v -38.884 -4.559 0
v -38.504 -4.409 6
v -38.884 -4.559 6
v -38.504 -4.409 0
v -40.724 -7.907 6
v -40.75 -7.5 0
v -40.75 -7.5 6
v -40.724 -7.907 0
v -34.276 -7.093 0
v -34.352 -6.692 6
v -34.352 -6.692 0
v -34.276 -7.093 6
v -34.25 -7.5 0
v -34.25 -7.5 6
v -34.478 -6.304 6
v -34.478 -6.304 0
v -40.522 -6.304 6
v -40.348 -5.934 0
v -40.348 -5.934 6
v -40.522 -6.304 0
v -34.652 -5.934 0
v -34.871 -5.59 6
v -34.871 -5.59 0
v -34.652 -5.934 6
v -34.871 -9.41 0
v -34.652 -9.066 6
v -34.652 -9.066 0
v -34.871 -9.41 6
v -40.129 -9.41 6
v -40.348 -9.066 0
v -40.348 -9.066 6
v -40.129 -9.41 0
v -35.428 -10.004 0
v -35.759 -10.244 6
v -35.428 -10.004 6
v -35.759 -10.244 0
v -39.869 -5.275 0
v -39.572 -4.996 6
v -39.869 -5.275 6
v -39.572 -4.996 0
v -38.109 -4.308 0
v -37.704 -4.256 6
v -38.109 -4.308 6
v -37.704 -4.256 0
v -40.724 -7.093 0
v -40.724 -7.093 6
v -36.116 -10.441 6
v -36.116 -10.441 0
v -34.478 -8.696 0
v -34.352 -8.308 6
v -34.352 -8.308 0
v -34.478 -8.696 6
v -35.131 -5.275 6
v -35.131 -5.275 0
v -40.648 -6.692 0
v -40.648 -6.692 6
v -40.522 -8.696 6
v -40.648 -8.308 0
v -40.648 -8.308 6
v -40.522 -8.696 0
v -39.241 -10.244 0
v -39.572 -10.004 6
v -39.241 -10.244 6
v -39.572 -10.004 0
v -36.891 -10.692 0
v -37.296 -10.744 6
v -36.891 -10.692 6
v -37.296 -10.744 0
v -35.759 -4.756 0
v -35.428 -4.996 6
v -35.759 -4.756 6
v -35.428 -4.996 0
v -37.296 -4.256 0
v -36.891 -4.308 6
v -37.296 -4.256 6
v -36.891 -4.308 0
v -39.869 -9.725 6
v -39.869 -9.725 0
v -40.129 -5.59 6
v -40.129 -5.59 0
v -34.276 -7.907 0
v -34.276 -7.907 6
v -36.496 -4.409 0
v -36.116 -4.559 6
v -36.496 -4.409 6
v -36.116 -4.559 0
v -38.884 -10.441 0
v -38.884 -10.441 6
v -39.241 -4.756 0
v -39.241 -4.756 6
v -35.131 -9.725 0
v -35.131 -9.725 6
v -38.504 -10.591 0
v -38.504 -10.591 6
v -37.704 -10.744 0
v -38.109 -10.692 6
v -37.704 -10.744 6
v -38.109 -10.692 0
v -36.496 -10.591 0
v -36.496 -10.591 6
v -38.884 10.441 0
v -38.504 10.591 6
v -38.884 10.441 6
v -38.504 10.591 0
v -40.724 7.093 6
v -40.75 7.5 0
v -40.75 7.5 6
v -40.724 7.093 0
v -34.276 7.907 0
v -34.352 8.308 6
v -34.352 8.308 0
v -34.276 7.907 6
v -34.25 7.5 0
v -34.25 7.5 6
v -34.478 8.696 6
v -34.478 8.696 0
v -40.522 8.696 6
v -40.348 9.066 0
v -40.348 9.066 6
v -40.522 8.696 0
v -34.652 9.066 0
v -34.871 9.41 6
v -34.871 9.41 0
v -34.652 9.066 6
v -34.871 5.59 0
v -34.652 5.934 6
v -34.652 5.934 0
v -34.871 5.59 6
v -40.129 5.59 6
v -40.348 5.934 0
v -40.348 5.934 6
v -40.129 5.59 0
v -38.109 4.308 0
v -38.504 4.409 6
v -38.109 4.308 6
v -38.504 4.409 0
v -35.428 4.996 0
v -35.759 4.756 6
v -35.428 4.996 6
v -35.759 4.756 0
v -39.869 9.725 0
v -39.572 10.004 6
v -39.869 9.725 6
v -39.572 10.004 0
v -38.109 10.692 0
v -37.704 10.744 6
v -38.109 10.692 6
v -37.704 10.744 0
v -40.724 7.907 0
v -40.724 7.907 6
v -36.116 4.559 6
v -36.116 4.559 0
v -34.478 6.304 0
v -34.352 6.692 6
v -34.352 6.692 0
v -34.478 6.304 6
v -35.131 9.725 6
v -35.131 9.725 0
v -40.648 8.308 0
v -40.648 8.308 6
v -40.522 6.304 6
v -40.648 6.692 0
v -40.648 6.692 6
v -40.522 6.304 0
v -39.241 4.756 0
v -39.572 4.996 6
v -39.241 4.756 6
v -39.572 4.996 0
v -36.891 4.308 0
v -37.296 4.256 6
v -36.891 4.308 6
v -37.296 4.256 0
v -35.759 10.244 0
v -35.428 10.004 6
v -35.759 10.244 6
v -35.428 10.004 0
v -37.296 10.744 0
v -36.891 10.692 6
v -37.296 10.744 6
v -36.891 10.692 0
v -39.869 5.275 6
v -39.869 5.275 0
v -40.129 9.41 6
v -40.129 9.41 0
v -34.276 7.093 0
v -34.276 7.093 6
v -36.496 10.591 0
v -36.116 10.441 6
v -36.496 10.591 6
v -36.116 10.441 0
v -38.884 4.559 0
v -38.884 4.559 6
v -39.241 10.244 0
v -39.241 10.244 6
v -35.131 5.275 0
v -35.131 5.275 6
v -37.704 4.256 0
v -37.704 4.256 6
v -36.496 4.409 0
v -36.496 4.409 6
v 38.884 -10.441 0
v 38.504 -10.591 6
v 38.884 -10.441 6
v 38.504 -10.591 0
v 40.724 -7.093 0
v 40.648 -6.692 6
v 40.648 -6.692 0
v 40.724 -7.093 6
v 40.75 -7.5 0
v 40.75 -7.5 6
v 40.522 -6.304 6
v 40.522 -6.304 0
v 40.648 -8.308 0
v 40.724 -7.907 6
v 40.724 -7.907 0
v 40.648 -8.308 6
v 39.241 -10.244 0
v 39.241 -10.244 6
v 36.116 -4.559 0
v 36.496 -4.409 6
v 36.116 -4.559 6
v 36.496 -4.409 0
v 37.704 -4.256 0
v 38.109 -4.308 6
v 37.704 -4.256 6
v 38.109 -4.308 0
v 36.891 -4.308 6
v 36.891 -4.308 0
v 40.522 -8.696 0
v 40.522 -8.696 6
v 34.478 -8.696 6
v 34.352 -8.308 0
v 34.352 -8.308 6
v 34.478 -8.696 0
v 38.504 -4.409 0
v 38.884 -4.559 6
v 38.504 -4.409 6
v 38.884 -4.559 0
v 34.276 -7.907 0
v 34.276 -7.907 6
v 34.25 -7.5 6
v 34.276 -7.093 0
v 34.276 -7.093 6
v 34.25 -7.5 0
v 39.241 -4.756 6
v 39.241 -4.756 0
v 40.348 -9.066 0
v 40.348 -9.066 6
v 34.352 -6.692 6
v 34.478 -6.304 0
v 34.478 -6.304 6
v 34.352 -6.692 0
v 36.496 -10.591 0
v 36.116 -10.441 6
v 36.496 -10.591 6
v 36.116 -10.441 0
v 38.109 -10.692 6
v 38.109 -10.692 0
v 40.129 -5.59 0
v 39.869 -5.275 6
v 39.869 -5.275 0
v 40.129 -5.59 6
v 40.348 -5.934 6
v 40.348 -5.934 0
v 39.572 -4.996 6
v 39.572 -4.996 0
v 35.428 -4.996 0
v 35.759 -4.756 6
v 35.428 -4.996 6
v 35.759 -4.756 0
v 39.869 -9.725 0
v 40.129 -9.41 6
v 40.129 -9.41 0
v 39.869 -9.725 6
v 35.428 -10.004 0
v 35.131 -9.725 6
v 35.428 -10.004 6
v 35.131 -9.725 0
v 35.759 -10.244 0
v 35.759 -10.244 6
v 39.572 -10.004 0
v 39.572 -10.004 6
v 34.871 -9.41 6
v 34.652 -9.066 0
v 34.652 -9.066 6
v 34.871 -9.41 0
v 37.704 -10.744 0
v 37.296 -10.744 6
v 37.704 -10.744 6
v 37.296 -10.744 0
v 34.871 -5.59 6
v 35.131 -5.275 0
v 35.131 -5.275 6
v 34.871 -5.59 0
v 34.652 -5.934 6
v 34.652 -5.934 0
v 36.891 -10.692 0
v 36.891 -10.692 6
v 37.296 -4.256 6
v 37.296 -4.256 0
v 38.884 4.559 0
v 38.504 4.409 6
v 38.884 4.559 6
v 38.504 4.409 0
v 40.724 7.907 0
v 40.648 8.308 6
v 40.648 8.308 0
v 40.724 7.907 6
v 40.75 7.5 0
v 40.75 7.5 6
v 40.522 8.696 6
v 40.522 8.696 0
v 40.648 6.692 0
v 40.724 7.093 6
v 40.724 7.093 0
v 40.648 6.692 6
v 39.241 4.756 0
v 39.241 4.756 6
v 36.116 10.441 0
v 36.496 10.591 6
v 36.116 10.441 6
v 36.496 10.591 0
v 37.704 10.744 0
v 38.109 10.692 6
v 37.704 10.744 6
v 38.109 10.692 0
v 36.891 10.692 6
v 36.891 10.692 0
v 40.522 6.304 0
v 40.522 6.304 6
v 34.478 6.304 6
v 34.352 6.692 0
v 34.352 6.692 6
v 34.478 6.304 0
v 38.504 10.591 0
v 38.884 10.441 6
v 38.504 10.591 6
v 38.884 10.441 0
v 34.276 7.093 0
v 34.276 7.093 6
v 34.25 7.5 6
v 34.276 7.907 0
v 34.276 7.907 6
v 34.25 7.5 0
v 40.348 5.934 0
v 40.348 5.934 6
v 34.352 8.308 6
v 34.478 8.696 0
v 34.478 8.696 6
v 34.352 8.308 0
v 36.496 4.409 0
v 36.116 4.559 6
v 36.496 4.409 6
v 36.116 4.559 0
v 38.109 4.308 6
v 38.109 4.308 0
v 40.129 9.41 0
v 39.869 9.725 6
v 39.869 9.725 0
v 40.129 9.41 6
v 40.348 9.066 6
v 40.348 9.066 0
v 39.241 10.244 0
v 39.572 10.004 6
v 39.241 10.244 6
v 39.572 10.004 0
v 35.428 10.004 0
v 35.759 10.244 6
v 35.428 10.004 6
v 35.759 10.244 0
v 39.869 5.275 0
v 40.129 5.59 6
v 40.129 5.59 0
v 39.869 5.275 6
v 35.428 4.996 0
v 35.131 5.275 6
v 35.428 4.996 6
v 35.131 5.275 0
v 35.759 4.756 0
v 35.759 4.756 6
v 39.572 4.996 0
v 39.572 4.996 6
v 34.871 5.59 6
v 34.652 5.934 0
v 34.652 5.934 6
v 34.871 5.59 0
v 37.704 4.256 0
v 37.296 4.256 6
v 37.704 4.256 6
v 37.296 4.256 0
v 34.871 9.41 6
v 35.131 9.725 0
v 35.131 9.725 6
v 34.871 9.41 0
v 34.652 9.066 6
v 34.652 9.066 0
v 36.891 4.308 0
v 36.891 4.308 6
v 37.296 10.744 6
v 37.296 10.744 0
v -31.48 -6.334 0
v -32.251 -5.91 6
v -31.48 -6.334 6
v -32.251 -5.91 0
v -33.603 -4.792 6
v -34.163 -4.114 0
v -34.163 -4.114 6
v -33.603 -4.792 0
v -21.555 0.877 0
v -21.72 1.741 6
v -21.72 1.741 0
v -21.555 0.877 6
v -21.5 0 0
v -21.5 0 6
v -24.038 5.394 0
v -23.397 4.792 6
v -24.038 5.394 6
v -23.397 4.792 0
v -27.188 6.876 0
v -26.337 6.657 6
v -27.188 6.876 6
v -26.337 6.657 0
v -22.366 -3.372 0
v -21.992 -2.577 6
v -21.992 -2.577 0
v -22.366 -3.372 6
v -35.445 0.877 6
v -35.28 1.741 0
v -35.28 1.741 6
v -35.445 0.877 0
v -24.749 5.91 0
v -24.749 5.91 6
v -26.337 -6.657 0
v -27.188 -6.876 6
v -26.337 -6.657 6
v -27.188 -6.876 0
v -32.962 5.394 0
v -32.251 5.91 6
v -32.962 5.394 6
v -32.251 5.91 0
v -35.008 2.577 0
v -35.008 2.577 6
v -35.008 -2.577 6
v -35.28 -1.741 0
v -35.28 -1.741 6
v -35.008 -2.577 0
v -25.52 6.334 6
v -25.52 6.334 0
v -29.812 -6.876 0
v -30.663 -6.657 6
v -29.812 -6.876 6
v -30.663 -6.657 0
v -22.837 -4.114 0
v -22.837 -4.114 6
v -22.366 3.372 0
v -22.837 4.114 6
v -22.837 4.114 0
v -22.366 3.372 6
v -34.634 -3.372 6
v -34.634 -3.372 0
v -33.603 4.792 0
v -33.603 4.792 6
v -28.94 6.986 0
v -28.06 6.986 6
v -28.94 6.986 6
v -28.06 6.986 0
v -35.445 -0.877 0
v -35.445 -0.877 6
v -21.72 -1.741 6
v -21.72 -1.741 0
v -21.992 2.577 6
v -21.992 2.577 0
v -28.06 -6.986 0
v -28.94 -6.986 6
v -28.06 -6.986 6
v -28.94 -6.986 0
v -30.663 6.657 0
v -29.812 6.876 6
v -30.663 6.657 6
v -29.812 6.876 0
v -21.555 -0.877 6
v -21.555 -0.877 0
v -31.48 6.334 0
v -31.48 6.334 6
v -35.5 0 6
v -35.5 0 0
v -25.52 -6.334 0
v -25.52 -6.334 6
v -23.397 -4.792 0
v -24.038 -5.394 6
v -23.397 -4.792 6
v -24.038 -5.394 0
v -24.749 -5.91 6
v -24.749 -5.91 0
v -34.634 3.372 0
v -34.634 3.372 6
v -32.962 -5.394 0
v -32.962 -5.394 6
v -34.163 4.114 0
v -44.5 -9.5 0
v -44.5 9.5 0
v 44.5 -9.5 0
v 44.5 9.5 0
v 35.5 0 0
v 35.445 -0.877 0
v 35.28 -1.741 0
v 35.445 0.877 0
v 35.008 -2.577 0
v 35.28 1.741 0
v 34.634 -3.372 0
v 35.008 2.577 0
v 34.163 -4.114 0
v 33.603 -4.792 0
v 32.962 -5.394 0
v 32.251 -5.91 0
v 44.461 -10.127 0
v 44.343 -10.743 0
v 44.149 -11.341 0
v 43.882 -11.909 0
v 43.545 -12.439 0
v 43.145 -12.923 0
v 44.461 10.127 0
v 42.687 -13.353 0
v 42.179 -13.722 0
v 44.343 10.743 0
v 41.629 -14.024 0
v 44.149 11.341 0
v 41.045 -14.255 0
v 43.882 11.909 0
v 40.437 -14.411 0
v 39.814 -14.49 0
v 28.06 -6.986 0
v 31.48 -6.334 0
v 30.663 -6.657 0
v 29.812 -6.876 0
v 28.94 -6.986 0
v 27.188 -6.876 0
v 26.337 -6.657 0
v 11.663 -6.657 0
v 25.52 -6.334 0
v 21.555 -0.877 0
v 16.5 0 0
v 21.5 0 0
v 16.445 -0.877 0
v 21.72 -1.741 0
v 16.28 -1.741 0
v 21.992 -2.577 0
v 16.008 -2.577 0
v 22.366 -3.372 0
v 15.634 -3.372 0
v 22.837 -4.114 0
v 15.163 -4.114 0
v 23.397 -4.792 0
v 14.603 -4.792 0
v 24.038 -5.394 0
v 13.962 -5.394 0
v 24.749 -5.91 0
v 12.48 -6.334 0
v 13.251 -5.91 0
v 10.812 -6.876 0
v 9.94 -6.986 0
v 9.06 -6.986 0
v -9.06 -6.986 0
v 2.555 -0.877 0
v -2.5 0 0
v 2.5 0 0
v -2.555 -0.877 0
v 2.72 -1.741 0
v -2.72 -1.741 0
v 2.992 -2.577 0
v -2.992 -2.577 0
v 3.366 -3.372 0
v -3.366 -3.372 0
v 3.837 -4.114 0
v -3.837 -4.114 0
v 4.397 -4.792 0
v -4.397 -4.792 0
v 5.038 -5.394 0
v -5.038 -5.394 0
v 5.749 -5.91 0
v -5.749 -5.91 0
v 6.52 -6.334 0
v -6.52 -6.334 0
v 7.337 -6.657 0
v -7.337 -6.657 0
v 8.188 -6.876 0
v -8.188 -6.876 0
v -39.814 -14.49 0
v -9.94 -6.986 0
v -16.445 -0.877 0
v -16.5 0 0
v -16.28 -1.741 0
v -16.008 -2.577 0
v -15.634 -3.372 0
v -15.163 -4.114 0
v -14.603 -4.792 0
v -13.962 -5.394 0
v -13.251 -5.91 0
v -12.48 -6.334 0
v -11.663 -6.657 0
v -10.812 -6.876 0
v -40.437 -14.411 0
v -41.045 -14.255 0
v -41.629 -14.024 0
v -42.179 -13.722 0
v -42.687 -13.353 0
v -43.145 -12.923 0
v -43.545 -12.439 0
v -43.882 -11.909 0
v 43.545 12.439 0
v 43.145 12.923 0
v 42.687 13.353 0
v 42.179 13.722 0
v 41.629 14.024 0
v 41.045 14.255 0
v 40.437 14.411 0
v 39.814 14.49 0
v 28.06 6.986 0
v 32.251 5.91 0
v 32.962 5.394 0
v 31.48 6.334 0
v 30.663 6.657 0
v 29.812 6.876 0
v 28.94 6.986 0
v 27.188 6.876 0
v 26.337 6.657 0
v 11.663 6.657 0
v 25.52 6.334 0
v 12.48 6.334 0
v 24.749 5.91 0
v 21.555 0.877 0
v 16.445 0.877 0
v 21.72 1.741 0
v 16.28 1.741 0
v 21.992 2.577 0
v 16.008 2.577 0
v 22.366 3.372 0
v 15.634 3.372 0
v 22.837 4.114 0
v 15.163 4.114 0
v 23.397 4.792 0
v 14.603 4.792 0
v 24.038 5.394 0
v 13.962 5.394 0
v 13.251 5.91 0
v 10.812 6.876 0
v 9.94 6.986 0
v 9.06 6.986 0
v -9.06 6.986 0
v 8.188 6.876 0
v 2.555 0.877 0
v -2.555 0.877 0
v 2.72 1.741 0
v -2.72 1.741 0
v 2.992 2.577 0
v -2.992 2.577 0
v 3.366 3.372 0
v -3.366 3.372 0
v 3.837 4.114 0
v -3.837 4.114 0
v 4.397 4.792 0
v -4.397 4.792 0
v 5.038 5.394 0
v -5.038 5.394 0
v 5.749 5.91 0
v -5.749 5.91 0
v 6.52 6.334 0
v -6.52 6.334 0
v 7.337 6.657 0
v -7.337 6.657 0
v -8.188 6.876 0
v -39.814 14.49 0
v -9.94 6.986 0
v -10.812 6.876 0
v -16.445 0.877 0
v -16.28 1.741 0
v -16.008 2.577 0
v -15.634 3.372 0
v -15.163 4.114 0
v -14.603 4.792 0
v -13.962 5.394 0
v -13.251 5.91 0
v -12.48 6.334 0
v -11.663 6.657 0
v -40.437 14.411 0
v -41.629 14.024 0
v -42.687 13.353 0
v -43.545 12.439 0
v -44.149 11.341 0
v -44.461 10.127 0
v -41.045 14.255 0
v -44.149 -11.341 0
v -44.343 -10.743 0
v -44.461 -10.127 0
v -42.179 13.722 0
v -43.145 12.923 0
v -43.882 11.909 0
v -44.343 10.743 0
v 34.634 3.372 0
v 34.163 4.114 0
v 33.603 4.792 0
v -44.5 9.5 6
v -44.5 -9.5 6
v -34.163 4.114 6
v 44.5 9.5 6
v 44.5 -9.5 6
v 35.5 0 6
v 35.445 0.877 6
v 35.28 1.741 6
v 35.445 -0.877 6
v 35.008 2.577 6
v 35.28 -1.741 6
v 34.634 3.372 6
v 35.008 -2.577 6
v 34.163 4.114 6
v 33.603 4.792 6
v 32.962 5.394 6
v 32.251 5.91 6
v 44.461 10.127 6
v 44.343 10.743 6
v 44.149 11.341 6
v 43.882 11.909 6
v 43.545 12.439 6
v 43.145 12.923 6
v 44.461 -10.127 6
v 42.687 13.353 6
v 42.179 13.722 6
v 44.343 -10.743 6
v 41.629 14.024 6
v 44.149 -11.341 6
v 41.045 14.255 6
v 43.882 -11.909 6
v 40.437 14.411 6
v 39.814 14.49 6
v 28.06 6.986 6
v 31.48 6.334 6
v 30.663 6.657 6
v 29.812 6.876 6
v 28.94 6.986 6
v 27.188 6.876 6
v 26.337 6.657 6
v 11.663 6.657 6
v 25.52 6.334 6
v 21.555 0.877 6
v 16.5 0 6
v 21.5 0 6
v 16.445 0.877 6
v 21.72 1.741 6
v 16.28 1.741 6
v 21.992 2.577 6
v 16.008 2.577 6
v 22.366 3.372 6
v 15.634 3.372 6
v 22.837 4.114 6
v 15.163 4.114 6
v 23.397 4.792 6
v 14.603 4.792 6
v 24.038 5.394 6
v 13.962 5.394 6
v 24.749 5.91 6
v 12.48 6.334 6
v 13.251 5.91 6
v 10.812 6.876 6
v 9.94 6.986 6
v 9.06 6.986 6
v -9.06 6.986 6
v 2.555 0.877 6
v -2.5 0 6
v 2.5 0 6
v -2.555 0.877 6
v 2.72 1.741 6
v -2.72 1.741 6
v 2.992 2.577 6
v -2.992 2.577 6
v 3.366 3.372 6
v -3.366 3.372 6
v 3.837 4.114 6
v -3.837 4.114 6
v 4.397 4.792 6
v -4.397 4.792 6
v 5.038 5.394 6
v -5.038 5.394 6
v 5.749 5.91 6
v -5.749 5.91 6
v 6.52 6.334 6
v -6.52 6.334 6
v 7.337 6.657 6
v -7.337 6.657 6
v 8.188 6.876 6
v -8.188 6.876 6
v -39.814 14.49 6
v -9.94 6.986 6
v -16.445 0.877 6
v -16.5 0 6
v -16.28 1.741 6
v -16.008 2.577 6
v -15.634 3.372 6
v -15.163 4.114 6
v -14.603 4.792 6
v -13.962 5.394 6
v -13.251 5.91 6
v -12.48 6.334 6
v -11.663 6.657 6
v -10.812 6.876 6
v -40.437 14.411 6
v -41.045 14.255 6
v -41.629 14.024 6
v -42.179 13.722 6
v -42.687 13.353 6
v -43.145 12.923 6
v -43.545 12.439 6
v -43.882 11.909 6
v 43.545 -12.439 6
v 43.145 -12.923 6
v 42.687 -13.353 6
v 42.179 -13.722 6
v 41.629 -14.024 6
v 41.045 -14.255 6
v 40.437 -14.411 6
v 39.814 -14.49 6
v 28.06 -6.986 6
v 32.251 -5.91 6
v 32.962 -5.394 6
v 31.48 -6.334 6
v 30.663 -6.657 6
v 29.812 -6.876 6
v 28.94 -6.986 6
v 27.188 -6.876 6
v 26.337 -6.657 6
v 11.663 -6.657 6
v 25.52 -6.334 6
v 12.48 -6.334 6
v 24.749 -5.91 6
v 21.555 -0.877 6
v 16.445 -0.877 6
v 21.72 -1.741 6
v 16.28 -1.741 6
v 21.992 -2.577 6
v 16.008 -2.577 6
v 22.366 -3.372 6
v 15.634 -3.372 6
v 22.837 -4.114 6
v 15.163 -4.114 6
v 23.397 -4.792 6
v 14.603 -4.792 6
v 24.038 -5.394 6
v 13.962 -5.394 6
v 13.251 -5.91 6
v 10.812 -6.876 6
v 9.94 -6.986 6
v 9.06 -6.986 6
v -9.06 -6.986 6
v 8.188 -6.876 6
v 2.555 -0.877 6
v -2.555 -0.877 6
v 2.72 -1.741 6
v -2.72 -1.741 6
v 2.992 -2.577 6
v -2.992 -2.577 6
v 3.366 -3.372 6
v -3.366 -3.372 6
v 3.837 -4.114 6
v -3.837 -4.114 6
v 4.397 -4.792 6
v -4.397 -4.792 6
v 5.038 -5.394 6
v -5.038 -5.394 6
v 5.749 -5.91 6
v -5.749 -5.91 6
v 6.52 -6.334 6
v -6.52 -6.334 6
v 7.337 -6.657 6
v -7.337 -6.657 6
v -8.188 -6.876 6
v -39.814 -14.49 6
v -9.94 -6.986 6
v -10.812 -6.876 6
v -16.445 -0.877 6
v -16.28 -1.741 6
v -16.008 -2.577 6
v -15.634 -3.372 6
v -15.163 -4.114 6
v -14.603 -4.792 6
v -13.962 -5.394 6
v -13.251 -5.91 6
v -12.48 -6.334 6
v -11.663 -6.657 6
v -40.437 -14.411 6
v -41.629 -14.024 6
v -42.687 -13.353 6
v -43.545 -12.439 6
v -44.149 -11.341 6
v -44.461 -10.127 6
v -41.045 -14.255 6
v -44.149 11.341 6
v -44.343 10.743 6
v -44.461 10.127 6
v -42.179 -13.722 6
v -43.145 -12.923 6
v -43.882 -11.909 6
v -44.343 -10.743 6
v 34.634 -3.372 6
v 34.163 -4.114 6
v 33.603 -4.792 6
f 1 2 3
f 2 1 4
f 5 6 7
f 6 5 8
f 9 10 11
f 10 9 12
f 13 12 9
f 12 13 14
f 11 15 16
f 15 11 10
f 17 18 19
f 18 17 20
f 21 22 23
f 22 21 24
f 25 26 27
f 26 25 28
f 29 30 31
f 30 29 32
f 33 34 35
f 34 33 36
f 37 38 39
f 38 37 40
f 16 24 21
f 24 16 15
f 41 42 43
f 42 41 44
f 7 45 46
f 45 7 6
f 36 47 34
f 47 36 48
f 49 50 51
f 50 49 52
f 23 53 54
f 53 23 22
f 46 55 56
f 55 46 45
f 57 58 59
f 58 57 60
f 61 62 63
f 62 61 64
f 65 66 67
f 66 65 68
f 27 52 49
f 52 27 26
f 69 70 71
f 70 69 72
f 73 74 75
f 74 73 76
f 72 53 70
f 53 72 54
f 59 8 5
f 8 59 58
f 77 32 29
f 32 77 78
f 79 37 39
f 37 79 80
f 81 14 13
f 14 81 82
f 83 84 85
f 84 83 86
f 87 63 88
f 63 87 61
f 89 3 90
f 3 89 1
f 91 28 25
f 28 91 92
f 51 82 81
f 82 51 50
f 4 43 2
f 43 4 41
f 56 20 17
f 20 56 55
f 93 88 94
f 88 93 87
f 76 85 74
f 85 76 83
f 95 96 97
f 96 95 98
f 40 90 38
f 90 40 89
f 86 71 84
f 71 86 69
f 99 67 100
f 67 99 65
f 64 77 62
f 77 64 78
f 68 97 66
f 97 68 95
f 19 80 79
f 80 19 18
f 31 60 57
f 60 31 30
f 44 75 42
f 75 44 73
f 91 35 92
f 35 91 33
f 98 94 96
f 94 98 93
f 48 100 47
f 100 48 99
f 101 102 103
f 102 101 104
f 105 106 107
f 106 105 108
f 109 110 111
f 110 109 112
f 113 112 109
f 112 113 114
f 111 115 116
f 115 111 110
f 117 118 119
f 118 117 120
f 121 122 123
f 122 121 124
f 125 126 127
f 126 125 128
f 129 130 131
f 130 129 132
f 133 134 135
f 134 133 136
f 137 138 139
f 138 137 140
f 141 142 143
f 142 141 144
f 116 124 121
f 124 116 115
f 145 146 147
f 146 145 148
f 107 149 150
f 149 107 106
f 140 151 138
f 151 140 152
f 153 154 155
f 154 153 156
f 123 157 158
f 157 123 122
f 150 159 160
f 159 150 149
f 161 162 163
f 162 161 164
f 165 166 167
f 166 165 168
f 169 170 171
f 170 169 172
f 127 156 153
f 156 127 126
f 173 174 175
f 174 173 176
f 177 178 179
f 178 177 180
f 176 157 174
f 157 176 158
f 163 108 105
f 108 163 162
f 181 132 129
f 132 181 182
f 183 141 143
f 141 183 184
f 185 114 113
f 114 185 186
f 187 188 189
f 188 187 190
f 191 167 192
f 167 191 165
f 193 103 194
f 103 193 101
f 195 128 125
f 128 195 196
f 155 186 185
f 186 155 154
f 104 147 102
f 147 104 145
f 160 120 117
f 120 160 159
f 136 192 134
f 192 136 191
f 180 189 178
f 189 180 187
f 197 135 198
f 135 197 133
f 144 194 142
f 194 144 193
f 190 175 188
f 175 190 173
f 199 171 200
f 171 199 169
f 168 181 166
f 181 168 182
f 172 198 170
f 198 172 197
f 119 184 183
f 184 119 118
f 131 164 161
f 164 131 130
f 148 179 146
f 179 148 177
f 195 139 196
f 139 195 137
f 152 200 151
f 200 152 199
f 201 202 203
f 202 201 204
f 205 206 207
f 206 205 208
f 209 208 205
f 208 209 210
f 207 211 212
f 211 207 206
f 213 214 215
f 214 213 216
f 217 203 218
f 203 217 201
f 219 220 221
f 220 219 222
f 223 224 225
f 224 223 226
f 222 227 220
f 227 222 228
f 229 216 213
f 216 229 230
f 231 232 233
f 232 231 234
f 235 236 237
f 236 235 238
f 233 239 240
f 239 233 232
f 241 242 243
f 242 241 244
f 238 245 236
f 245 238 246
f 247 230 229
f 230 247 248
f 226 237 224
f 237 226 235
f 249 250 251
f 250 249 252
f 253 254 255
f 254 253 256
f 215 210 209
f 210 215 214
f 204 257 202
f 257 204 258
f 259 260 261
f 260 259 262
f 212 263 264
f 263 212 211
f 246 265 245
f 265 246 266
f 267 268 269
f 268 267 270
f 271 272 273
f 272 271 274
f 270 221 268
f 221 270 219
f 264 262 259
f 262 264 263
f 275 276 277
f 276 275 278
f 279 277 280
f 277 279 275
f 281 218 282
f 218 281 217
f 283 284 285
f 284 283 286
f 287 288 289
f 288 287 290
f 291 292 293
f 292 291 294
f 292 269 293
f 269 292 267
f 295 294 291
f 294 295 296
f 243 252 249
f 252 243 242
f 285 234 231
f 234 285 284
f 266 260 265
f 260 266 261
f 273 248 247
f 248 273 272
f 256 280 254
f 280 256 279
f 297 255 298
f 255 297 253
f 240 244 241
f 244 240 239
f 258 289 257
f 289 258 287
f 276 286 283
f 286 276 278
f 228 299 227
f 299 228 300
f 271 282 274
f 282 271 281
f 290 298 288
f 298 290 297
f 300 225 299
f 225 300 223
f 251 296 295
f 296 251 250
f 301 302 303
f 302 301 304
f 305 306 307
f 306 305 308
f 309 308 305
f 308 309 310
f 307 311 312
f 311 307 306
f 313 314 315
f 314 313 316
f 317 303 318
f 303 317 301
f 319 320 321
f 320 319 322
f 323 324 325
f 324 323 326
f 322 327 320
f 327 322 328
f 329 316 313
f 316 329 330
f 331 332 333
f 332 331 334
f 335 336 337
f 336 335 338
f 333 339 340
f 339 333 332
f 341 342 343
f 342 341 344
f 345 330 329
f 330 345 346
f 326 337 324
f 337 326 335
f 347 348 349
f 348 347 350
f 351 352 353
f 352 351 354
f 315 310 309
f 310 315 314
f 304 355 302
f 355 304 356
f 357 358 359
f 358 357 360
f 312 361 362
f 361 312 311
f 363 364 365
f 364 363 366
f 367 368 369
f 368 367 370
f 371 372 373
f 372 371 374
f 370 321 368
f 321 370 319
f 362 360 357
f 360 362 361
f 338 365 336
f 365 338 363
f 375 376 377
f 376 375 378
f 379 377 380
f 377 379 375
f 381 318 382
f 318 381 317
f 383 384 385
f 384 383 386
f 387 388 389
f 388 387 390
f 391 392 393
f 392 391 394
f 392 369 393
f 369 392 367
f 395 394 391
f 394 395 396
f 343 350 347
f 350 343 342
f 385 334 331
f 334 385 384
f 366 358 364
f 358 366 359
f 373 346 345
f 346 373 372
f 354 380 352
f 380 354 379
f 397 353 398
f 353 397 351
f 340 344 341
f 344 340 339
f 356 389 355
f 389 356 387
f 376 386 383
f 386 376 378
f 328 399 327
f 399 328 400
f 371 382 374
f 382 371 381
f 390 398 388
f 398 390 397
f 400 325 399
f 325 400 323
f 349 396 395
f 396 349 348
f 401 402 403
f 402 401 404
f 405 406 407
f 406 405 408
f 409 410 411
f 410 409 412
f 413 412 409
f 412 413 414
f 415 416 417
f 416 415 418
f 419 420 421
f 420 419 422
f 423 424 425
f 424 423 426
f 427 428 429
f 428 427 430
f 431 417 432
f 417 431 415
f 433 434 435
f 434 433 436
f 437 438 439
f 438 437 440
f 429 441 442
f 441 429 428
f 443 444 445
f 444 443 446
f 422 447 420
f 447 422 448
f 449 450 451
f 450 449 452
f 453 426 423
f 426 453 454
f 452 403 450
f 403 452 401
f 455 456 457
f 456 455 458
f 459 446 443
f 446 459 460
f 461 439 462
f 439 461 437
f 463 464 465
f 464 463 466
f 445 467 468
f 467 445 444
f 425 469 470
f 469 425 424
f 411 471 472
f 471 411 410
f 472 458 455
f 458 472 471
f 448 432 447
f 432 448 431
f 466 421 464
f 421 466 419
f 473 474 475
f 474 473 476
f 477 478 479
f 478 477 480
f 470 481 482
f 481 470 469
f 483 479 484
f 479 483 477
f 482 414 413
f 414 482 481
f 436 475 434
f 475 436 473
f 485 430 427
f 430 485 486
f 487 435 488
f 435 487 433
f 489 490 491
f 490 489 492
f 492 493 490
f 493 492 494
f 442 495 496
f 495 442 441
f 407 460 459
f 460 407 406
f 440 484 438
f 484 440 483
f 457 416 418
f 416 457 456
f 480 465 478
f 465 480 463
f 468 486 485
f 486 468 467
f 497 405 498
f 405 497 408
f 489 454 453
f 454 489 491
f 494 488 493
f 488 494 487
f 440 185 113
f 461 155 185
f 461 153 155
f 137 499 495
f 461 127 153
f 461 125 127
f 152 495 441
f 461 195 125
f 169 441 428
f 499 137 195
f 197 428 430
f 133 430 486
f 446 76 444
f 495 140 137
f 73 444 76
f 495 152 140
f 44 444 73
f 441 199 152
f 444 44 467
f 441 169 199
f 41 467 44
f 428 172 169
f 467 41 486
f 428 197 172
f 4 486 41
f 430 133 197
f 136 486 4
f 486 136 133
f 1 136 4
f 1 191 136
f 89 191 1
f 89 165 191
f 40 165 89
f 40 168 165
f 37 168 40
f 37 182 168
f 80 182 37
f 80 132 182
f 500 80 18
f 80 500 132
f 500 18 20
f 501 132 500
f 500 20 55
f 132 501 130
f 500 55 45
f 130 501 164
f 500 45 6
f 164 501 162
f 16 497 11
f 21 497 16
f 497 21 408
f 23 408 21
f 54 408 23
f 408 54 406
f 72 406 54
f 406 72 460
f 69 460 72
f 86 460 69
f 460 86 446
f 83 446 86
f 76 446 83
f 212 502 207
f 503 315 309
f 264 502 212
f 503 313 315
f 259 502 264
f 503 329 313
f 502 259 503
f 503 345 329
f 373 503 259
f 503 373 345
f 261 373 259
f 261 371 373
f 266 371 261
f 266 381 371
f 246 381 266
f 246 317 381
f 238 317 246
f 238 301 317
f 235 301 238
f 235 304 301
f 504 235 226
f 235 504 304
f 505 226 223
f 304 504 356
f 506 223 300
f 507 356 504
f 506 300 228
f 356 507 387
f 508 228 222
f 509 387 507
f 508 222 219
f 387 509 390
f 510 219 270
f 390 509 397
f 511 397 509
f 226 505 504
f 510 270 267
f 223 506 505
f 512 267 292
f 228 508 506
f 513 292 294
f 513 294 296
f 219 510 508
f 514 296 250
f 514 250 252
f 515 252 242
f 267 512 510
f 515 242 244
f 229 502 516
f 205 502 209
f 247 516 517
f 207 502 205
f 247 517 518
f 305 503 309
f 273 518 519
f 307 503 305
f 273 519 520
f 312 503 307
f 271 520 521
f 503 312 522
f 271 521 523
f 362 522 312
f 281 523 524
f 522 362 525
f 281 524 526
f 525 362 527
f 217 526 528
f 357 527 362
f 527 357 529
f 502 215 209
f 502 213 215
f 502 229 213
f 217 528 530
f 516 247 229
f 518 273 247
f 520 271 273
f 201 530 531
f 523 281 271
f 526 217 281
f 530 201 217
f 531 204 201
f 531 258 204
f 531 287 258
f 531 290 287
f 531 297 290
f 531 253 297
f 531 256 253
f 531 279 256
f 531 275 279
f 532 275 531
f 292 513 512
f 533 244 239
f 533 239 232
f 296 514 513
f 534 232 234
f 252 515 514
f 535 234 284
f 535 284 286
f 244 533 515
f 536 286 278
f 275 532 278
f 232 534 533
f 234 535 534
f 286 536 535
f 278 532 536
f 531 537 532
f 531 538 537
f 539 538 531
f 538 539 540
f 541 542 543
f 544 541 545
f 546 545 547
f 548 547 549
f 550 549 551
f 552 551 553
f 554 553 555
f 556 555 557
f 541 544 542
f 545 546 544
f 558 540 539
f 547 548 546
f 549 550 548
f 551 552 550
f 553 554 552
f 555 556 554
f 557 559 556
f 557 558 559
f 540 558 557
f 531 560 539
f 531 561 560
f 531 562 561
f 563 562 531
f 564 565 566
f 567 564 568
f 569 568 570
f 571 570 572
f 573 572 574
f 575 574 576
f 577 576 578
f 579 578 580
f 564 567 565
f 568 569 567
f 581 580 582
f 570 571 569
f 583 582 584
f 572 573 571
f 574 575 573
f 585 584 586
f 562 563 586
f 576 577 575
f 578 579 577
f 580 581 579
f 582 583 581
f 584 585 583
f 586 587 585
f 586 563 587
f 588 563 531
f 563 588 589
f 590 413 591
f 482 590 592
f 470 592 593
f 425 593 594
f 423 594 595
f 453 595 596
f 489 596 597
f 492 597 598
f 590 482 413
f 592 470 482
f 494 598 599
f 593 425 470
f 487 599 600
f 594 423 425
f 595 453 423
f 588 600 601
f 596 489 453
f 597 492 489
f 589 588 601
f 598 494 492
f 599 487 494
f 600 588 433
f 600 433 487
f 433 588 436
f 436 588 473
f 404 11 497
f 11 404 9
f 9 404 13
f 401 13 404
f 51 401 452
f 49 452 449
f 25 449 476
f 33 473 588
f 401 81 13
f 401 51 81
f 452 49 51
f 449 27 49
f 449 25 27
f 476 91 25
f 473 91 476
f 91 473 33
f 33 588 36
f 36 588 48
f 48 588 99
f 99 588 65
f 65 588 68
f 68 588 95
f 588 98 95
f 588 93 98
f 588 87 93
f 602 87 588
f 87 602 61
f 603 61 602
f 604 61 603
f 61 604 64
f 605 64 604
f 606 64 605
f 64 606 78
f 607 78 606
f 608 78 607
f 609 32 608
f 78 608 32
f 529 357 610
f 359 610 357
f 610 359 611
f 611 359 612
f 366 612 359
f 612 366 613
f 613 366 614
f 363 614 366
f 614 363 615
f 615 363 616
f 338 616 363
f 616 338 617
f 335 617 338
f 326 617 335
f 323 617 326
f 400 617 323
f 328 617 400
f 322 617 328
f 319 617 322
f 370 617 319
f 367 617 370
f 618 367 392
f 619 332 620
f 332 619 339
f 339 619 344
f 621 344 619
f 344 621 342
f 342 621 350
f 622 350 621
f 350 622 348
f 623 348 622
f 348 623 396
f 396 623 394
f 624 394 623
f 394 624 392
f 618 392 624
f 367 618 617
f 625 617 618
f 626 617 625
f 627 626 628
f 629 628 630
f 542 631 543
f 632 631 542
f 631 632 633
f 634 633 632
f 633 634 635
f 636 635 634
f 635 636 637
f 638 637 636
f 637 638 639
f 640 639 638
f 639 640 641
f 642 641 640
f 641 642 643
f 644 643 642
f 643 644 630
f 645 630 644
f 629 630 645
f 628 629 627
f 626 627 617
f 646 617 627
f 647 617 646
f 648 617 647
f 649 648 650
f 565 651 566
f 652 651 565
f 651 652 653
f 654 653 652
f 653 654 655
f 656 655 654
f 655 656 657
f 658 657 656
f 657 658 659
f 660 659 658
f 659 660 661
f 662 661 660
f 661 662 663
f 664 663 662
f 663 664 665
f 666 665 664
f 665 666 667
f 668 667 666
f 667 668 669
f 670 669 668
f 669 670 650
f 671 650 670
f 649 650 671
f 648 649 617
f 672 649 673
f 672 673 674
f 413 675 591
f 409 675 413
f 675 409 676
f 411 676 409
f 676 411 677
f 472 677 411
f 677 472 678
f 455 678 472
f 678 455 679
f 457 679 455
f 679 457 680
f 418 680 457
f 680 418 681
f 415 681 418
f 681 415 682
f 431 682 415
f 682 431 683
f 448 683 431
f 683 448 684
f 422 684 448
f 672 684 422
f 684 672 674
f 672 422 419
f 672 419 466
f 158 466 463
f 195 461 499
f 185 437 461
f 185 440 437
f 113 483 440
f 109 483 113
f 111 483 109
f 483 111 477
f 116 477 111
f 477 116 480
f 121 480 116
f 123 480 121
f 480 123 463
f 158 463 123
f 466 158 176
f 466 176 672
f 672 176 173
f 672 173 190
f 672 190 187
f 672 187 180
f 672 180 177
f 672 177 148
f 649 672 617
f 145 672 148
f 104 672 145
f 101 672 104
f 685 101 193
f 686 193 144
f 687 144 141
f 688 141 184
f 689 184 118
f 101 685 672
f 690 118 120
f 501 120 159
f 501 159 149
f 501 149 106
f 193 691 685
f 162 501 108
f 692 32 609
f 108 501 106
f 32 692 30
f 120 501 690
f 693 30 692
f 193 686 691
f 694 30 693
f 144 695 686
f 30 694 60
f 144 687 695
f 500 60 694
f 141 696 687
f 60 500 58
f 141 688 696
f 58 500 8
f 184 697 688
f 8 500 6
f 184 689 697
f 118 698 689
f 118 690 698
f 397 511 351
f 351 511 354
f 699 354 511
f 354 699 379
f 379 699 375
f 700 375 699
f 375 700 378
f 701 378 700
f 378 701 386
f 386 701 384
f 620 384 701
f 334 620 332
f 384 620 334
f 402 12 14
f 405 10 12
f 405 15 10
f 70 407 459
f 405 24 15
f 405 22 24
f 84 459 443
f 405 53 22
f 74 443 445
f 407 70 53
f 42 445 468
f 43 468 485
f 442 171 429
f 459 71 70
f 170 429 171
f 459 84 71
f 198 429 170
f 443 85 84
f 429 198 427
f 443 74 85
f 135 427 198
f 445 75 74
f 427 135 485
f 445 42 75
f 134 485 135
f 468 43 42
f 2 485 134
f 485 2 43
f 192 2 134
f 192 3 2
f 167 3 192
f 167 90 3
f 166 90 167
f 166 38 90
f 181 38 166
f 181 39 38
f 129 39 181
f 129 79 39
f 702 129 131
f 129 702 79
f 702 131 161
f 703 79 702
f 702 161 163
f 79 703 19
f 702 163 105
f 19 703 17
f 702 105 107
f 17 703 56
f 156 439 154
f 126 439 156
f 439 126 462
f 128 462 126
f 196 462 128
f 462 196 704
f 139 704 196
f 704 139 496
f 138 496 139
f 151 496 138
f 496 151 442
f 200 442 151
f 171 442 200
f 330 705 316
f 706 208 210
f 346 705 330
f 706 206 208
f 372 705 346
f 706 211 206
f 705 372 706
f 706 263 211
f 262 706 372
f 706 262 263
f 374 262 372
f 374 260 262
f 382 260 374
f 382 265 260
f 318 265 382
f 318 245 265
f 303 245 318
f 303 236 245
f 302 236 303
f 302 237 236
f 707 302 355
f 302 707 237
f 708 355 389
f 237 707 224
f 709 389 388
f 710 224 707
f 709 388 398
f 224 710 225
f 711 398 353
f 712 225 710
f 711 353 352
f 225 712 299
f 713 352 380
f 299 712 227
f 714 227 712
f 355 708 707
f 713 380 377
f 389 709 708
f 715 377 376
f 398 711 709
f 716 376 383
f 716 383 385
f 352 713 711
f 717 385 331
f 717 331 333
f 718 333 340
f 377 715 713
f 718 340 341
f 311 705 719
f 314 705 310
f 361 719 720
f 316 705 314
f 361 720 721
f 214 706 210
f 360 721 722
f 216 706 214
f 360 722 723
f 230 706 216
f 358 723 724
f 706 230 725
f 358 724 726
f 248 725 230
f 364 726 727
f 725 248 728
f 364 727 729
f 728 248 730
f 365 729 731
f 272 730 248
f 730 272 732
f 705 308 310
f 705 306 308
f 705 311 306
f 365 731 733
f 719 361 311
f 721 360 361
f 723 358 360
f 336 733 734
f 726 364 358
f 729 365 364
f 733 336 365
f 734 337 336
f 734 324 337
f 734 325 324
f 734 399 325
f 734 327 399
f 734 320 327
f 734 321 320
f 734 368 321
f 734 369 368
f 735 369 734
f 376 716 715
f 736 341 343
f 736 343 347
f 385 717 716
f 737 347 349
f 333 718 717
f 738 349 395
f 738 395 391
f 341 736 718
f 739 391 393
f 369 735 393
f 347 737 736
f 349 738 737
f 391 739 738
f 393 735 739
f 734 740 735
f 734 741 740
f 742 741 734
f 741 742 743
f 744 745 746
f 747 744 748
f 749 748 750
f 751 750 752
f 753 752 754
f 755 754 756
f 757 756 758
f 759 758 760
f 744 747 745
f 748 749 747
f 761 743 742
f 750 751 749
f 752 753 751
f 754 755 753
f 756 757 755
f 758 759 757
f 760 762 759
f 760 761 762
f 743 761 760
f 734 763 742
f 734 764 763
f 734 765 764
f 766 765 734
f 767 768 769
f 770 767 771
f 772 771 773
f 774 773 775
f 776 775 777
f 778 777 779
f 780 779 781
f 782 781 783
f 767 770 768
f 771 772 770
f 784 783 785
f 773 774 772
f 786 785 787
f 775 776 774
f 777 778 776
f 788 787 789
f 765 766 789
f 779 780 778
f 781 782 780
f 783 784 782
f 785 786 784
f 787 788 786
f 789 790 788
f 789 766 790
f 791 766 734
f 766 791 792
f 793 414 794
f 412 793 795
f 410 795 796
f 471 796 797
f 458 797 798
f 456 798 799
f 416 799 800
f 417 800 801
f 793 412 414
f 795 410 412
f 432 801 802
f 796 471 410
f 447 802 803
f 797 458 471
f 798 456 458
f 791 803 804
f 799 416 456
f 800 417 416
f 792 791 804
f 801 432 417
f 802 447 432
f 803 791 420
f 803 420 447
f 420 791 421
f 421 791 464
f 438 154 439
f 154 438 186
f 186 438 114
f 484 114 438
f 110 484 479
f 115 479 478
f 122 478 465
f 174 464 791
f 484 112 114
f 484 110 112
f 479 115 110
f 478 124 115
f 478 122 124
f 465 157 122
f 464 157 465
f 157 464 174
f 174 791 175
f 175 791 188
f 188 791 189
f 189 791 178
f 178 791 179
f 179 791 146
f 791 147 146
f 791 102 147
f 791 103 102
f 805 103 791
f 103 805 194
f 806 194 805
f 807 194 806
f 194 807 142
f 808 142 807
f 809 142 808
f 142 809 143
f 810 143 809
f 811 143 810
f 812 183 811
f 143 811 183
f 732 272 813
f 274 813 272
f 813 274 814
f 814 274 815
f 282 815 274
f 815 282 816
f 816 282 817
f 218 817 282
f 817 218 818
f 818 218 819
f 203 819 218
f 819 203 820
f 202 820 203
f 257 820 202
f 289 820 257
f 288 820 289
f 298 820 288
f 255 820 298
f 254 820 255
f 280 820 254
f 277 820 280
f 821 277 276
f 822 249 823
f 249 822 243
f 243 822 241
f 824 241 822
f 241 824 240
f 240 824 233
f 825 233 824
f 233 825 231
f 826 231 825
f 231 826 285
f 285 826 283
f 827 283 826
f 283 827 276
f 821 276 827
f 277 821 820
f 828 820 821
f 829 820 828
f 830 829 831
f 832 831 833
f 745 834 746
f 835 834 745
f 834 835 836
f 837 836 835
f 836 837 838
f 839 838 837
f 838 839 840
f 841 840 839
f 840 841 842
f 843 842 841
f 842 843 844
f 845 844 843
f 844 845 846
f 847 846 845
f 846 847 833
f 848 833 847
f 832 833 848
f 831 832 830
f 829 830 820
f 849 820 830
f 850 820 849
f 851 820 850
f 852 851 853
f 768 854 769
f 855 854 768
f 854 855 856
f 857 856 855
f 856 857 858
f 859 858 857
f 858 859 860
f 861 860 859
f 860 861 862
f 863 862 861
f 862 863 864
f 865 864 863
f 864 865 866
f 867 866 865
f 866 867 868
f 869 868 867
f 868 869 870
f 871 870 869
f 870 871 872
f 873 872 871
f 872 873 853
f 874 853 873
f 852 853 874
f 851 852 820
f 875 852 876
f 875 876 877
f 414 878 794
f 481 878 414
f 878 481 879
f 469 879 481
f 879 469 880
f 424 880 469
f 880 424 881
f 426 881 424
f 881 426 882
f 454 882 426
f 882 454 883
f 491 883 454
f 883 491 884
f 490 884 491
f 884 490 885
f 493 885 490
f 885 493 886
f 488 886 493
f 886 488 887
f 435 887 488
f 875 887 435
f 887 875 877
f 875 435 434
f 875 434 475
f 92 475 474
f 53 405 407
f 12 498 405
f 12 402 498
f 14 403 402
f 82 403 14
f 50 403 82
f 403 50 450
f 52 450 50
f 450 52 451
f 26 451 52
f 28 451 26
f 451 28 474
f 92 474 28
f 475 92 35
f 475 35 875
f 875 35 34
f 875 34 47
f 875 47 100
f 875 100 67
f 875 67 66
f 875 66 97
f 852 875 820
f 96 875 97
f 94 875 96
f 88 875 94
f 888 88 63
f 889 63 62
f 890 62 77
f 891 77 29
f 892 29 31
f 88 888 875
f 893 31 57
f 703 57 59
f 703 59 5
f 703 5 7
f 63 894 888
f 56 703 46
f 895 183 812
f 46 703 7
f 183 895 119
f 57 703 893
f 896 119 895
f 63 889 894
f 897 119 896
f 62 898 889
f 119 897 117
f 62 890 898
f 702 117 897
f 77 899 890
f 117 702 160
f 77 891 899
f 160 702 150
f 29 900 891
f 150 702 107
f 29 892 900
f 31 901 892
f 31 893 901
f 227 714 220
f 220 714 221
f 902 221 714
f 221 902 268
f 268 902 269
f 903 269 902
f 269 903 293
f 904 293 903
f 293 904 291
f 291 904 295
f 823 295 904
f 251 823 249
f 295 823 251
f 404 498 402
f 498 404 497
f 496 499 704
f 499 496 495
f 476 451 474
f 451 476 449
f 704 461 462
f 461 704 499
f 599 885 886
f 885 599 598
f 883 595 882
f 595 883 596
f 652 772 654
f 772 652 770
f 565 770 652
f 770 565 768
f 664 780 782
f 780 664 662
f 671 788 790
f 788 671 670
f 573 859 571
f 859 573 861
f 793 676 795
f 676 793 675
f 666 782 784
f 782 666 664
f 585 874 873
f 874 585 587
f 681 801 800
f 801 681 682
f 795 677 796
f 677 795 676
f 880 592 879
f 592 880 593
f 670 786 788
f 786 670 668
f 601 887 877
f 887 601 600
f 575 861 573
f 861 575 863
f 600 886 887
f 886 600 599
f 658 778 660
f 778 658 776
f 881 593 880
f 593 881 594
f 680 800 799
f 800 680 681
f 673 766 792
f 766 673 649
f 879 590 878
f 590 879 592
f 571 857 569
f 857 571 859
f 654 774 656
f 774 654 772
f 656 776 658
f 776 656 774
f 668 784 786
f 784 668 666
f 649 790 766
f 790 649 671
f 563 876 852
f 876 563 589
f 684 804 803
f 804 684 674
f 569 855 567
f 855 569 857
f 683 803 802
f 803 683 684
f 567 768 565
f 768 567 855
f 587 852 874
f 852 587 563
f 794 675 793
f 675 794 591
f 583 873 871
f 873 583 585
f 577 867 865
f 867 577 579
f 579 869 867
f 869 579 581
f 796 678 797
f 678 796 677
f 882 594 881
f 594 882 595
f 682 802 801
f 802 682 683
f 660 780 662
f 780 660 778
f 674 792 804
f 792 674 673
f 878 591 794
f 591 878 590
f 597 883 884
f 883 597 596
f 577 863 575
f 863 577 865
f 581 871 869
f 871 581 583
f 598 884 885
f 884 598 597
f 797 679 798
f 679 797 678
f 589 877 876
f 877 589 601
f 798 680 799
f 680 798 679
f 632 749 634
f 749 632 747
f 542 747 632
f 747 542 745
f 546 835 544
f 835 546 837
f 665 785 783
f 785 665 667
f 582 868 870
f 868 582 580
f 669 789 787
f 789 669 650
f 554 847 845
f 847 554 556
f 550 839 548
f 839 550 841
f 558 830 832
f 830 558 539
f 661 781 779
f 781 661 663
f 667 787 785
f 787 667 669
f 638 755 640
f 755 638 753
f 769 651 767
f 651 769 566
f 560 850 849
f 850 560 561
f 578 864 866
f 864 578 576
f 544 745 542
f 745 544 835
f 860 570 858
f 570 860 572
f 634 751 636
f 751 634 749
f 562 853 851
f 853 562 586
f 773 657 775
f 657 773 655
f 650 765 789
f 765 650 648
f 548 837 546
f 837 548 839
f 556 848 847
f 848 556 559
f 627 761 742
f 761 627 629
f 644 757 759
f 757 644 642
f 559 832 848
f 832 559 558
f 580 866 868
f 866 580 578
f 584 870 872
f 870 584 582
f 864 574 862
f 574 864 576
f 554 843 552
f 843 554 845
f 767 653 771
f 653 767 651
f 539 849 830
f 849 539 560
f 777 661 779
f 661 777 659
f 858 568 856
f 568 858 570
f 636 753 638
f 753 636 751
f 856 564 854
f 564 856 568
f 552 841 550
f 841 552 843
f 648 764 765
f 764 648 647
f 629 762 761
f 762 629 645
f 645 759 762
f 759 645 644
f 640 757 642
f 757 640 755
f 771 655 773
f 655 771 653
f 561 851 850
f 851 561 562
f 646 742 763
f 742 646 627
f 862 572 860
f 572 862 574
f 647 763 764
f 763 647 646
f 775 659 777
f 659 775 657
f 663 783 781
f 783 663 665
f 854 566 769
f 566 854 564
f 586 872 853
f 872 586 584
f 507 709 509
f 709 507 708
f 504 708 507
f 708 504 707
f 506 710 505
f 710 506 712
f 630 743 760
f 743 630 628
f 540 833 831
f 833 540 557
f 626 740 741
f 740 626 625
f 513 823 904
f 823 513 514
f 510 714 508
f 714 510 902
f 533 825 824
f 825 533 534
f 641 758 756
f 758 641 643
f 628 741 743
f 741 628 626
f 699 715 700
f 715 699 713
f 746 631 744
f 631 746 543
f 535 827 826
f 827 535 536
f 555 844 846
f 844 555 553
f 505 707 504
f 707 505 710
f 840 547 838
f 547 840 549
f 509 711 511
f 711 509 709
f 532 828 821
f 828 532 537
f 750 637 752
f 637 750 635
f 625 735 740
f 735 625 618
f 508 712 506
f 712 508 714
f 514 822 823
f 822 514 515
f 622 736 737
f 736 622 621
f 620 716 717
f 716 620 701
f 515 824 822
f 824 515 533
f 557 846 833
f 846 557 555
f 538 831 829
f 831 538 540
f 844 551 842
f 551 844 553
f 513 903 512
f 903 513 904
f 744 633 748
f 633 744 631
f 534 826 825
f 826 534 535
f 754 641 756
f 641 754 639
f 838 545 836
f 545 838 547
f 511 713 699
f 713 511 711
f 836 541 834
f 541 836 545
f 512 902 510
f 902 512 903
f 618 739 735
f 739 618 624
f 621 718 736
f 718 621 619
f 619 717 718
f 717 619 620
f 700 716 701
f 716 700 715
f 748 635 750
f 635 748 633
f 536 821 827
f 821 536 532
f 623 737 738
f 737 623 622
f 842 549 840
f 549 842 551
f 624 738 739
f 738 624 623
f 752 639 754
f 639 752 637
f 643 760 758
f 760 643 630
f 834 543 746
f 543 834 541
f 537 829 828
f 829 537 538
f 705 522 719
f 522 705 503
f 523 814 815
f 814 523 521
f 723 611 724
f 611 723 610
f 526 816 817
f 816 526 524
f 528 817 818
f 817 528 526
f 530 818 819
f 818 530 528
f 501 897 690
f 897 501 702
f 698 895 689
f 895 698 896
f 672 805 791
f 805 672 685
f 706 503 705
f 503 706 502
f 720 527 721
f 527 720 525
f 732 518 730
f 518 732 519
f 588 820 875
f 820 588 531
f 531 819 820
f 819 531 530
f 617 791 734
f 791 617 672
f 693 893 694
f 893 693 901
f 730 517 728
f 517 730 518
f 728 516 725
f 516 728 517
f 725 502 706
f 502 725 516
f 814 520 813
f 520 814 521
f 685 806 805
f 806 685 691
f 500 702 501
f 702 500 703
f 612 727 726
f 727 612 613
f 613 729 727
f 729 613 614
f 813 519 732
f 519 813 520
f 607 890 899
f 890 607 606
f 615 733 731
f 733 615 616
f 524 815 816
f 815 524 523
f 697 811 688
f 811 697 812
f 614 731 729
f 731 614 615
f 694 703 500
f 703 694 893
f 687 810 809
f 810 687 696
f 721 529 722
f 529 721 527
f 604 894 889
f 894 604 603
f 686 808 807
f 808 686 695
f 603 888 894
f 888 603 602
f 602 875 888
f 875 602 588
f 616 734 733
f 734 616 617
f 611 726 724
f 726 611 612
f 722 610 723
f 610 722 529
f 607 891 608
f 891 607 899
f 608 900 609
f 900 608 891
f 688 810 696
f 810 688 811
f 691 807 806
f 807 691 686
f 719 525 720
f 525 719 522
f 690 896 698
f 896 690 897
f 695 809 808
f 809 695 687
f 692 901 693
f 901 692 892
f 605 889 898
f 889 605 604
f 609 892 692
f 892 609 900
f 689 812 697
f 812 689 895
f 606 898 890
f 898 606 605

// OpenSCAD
$fn = 50;


difference() {
	union() {
		hull() {
			translate(v = [-39.5000000000, 9.5000000000, 0]) {
				cylinder(h = 6, r = 5);
			}
			translate(v = [39.5000000000, 9.5000000000, 0]) {
				cylinder(h = 6, r = 5);
			}
			translate(v = [-39.5000000000, -9.5000000000, 0]) {
				cylinder(h = 6, r = 5);
			}
			translate(v = [39.5000000000, -9.5000000000, 0]) {
				cylinder(h = 6, r = 5);
			}
		}
	}
	union() {
		#translate(v = [-37.5000000000, -7.5000000000, -100.0000000000]) {
			cylinder(h = 200, r = 3.2500000000);
		}
		#translate(v = [-37.5000000000, 7.5000000000, -100.0000000000]) {
			cylinder(h = 200, r = 3.2500000000);
		}
		#translate(v = [37.5000000000, -7.5000000000, -100.0000000000]) {
			cylinder(h = 200, r = 3.2500000000);
		}
		#translate(v = [37.5000000000, 7.5000000000, -100.0000000000]) {
			cylinder(h = 200, r = 3.2500000000);
		}
		#translate(v = [-28.5000000000, 0, 0]) {
			cylinder(h = 6, r = 7.0000000000);
		}
		#translate(v = [-9.5000000000, 0, 0]) {
			cylinder(h = 6, r = 7.0000000000);
		}
		#translate(v = [9.5000000000, 0, 0]) {
			cylinder(h = 6, r = 7.0000000000);
		}
		#translate(v = [28.5000000000, 0, 0]) {
			cylinder(h = 6, r = 7.0000000000);
		}
	}
}
